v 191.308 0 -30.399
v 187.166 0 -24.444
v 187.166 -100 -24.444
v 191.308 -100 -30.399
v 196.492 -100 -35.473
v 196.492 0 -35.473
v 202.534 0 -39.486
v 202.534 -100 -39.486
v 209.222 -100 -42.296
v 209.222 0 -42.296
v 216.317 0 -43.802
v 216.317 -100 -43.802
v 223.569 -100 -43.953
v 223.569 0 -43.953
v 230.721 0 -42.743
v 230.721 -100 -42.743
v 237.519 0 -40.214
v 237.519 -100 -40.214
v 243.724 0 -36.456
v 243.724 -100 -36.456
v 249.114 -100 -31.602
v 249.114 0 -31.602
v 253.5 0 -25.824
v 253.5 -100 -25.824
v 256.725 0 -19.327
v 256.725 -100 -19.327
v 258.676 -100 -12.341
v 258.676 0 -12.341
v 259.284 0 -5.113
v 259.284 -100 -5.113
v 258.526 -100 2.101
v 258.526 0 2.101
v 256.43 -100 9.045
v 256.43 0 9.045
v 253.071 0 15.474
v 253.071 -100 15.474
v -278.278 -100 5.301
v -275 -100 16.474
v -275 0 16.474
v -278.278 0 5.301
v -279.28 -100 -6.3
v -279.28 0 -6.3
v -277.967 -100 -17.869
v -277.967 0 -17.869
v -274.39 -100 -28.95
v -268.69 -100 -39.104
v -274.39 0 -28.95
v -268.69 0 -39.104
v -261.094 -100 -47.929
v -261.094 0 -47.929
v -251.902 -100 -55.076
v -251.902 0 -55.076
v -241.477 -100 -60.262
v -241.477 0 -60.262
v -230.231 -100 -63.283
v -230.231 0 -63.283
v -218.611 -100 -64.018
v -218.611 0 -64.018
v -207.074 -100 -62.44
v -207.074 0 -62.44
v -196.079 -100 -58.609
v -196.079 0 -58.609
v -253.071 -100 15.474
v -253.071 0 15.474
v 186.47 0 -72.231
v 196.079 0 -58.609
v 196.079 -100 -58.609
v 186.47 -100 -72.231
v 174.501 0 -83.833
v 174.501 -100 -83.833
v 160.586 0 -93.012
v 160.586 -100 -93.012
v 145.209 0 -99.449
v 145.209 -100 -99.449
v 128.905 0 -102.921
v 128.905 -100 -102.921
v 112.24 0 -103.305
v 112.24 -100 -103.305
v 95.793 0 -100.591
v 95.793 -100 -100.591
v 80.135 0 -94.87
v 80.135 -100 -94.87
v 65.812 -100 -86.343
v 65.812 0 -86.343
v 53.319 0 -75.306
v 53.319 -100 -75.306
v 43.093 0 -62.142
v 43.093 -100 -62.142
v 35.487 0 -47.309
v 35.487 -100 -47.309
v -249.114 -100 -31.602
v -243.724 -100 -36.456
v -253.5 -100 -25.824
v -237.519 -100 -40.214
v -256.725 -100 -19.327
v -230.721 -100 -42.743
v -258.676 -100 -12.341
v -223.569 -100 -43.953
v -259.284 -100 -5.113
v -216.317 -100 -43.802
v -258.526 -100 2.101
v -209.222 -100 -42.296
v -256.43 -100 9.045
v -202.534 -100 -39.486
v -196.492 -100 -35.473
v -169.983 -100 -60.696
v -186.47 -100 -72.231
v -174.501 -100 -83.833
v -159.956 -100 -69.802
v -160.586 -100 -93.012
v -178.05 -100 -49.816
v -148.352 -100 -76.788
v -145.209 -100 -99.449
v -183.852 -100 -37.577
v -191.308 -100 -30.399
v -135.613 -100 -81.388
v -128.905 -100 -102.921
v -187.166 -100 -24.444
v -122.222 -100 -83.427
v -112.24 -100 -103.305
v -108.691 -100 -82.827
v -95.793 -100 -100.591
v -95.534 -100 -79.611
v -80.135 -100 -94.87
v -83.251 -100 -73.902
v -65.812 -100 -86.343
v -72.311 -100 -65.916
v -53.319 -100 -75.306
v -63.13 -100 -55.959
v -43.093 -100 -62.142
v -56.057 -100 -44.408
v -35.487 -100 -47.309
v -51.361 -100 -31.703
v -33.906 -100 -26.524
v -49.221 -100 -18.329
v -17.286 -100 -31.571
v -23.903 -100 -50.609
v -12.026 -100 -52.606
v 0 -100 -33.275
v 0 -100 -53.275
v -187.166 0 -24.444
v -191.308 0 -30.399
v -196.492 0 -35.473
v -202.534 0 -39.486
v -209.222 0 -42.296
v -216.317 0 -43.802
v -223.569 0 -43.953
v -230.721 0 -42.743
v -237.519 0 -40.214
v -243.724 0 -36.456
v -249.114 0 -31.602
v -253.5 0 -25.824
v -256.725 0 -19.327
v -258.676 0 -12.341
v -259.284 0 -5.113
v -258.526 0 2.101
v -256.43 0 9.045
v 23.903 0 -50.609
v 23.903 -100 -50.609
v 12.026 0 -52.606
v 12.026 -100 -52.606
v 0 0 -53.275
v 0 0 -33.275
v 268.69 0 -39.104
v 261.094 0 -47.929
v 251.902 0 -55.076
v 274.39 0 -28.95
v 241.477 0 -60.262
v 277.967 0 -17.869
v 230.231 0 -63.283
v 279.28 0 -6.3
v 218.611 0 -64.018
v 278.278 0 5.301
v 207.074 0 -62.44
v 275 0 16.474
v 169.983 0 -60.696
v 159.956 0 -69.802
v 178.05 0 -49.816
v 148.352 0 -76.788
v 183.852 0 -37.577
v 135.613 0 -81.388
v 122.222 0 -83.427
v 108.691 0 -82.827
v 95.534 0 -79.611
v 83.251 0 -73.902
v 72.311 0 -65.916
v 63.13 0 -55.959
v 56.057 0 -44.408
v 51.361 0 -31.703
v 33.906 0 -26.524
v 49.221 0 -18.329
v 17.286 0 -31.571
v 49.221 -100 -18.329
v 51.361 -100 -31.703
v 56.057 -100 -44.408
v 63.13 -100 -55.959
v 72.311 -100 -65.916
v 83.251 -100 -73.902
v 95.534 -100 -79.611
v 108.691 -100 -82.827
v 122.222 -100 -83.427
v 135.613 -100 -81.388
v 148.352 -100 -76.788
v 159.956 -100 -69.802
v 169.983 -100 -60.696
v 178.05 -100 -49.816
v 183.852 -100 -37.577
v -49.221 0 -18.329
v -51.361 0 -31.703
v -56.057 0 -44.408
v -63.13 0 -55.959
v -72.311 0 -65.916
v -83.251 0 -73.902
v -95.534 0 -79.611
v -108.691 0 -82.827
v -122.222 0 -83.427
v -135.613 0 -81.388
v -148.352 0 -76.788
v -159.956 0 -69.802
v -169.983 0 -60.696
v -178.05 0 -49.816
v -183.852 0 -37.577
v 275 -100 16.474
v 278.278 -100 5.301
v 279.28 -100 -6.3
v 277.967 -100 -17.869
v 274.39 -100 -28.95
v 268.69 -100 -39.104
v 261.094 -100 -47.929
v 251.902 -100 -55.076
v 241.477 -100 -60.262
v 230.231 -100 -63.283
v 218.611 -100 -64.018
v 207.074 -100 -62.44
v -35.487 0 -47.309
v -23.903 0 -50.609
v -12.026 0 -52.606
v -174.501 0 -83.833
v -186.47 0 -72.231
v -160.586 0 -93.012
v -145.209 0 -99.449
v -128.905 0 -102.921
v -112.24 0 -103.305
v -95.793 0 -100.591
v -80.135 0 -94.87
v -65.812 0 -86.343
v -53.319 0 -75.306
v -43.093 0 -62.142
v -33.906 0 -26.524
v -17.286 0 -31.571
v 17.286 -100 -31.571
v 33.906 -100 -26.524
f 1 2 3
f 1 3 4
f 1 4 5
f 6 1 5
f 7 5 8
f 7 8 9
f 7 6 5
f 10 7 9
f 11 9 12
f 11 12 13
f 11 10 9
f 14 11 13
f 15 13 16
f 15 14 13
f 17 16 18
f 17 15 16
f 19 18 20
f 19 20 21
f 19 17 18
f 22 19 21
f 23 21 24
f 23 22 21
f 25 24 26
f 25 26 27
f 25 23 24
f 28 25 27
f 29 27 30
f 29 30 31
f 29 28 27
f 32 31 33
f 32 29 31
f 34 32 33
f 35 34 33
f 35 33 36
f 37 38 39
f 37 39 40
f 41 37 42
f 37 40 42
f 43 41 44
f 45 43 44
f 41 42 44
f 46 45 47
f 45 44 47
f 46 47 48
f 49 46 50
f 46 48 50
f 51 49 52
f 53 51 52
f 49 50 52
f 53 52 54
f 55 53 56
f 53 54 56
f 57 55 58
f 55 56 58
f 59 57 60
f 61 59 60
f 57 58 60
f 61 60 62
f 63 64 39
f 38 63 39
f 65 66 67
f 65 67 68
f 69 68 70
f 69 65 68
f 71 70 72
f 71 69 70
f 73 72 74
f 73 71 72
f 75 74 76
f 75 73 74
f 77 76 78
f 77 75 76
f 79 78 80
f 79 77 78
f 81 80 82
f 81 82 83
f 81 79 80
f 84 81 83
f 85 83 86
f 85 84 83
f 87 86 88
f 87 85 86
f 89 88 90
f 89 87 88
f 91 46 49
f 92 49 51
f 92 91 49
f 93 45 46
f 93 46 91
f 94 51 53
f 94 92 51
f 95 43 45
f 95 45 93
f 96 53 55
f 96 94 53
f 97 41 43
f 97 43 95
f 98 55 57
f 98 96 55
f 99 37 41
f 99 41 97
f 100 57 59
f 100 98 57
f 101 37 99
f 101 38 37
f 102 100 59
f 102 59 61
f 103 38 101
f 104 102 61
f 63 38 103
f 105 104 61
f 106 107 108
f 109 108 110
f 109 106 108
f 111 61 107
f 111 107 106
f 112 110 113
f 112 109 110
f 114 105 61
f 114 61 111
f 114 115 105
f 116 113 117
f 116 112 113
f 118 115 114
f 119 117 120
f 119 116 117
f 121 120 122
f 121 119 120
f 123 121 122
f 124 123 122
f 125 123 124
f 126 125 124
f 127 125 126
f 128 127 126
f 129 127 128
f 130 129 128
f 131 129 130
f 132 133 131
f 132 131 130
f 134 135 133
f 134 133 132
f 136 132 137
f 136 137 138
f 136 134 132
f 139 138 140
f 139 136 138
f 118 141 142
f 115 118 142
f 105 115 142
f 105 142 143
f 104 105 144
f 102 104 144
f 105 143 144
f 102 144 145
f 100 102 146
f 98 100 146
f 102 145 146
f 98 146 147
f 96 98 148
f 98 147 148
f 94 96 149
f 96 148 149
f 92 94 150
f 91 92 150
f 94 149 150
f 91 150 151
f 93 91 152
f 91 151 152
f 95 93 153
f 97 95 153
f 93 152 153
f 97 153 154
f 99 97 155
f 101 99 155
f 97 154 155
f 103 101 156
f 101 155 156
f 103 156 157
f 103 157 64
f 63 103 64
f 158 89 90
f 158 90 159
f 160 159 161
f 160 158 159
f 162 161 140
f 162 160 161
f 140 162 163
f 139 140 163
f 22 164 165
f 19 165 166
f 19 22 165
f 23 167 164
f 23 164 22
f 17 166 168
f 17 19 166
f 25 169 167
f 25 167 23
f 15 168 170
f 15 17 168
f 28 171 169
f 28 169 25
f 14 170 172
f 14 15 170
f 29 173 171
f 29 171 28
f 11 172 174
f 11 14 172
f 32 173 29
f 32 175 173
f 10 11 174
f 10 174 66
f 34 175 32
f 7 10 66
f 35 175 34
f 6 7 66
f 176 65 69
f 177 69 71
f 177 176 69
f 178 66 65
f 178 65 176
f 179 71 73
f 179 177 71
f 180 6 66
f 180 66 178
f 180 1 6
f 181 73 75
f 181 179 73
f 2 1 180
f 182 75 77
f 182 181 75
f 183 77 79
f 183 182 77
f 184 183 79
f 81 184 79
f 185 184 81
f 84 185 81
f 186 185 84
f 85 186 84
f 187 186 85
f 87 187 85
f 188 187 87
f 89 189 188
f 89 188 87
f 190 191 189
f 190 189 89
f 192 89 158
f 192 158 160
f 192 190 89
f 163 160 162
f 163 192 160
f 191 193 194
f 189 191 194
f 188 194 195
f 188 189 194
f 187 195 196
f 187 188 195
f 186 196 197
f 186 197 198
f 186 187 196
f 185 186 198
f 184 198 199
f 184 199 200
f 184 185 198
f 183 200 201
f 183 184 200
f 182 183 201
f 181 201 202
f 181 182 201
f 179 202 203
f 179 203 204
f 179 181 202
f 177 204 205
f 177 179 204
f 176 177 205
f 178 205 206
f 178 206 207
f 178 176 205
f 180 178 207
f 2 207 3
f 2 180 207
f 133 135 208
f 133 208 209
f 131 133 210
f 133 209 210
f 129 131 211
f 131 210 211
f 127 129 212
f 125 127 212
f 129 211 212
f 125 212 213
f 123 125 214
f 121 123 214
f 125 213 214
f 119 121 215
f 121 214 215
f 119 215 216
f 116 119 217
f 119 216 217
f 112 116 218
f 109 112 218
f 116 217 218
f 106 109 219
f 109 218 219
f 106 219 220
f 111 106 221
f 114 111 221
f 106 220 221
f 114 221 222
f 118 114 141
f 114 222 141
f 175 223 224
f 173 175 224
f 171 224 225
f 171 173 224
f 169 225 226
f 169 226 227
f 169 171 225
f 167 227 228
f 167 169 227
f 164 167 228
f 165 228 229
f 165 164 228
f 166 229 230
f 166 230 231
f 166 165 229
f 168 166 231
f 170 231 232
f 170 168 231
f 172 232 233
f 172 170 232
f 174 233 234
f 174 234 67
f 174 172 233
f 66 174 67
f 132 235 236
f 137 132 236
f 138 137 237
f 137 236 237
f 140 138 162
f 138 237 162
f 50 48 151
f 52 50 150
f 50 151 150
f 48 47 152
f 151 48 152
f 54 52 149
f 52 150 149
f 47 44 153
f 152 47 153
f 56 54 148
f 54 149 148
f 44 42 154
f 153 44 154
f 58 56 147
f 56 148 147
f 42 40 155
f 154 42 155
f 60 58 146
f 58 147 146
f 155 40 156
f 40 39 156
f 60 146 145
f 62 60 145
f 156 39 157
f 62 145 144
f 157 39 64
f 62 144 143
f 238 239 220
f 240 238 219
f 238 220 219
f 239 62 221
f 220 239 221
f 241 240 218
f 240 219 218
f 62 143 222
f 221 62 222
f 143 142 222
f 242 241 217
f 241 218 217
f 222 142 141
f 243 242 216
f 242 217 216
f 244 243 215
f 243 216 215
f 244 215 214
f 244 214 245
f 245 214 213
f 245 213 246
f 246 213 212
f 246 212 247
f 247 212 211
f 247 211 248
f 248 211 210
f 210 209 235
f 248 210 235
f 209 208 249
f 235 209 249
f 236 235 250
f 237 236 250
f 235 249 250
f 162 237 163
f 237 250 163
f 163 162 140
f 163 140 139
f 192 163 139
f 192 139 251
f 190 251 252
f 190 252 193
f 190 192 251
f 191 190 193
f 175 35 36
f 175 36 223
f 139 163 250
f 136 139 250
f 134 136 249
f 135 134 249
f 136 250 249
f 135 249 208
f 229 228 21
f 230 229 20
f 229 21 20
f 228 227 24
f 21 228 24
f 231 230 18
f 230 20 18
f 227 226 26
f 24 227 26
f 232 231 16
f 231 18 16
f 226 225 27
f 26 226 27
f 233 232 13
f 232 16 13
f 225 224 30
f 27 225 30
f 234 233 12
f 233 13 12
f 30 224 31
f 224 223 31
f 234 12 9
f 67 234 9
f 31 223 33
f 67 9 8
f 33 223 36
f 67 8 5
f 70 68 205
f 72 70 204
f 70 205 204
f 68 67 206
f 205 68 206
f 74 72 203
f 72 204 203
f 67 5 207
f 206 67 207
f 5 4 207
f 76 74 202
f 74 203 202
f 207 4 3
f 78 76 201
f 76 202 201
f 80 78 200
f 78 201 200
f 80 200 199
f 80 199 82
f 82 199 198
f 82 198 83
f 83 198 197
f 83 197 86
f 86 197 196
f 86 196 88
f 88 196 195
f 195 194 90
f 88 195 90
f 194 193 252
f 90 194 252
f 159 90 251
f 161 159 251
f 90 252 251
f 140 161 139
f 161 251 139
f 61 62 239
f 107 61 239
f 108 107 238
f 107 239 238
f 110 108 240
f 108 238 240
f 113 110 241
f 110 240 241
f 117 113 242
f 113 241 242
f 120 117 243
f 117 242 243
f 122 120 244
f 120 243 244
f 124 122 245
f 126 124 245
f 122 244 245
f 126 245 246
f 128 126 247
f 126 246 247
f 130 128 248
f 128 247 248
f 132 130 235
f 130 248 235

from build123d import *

# Parameters (mm, degrees)
F1_DEPTH = 100


# Not quite as in the source:
# - a pattern or mirror of a feature is missing from the dataset's text; its kind, count and spacing are read off the source's solid


with BuildPart() as f1:
    # F0 (on Front) → F1 (new body)
    with BuildSketch(Plane.XZ):
        with BuildLine():
            Line((-253.070826319, 15.4742012591), (-275, 16.4739655934))
            ThreePointArc((-275, 16.4739655934), (-261.0940304281, -47.9287208885), (-196.0785287696, -58.6089156394))
            ThreePointArc((-196.0785287696, -58.6089156394), (-112.2399003638, -103.305461967), (-35.4867419071, -47.3085912196))
            ThreePointArc((-35.4867419071, -47.3085912196), (-17.9923791465, -51.7727499469), (0, -53.2746601281))
            Line((0, -53.2746601281), (0, -33.2746601281))
            ThreePointArc((0, -33.2746601281), (-25.7203043518, -29.4557449875), (-49.2214237237, -18.3285010758))
            ThreePointArc((-49.2214237237, -18.3285010758), (-115.4421026575, -83.4579108167), (-187.166437391, -24.4440299182))
            ThreePointArc((-187.166437391, -24.4440299182), (-240.7101933499, -38.4812673083), (-253.070826319, 15.4742012591))
        make_face()
    extrude(amount=F1_DEPTH)


with BuildPart() as f1_copies_1:
    # F1_copies: instance of F1
    add(f1.part.mirror(Plane(origin=(0, 0, 0), x_dir=(0, 0, 1), z_dir=(1, 0, 0))))


solid = Compound([f1.part, f1_copies_1.part])
